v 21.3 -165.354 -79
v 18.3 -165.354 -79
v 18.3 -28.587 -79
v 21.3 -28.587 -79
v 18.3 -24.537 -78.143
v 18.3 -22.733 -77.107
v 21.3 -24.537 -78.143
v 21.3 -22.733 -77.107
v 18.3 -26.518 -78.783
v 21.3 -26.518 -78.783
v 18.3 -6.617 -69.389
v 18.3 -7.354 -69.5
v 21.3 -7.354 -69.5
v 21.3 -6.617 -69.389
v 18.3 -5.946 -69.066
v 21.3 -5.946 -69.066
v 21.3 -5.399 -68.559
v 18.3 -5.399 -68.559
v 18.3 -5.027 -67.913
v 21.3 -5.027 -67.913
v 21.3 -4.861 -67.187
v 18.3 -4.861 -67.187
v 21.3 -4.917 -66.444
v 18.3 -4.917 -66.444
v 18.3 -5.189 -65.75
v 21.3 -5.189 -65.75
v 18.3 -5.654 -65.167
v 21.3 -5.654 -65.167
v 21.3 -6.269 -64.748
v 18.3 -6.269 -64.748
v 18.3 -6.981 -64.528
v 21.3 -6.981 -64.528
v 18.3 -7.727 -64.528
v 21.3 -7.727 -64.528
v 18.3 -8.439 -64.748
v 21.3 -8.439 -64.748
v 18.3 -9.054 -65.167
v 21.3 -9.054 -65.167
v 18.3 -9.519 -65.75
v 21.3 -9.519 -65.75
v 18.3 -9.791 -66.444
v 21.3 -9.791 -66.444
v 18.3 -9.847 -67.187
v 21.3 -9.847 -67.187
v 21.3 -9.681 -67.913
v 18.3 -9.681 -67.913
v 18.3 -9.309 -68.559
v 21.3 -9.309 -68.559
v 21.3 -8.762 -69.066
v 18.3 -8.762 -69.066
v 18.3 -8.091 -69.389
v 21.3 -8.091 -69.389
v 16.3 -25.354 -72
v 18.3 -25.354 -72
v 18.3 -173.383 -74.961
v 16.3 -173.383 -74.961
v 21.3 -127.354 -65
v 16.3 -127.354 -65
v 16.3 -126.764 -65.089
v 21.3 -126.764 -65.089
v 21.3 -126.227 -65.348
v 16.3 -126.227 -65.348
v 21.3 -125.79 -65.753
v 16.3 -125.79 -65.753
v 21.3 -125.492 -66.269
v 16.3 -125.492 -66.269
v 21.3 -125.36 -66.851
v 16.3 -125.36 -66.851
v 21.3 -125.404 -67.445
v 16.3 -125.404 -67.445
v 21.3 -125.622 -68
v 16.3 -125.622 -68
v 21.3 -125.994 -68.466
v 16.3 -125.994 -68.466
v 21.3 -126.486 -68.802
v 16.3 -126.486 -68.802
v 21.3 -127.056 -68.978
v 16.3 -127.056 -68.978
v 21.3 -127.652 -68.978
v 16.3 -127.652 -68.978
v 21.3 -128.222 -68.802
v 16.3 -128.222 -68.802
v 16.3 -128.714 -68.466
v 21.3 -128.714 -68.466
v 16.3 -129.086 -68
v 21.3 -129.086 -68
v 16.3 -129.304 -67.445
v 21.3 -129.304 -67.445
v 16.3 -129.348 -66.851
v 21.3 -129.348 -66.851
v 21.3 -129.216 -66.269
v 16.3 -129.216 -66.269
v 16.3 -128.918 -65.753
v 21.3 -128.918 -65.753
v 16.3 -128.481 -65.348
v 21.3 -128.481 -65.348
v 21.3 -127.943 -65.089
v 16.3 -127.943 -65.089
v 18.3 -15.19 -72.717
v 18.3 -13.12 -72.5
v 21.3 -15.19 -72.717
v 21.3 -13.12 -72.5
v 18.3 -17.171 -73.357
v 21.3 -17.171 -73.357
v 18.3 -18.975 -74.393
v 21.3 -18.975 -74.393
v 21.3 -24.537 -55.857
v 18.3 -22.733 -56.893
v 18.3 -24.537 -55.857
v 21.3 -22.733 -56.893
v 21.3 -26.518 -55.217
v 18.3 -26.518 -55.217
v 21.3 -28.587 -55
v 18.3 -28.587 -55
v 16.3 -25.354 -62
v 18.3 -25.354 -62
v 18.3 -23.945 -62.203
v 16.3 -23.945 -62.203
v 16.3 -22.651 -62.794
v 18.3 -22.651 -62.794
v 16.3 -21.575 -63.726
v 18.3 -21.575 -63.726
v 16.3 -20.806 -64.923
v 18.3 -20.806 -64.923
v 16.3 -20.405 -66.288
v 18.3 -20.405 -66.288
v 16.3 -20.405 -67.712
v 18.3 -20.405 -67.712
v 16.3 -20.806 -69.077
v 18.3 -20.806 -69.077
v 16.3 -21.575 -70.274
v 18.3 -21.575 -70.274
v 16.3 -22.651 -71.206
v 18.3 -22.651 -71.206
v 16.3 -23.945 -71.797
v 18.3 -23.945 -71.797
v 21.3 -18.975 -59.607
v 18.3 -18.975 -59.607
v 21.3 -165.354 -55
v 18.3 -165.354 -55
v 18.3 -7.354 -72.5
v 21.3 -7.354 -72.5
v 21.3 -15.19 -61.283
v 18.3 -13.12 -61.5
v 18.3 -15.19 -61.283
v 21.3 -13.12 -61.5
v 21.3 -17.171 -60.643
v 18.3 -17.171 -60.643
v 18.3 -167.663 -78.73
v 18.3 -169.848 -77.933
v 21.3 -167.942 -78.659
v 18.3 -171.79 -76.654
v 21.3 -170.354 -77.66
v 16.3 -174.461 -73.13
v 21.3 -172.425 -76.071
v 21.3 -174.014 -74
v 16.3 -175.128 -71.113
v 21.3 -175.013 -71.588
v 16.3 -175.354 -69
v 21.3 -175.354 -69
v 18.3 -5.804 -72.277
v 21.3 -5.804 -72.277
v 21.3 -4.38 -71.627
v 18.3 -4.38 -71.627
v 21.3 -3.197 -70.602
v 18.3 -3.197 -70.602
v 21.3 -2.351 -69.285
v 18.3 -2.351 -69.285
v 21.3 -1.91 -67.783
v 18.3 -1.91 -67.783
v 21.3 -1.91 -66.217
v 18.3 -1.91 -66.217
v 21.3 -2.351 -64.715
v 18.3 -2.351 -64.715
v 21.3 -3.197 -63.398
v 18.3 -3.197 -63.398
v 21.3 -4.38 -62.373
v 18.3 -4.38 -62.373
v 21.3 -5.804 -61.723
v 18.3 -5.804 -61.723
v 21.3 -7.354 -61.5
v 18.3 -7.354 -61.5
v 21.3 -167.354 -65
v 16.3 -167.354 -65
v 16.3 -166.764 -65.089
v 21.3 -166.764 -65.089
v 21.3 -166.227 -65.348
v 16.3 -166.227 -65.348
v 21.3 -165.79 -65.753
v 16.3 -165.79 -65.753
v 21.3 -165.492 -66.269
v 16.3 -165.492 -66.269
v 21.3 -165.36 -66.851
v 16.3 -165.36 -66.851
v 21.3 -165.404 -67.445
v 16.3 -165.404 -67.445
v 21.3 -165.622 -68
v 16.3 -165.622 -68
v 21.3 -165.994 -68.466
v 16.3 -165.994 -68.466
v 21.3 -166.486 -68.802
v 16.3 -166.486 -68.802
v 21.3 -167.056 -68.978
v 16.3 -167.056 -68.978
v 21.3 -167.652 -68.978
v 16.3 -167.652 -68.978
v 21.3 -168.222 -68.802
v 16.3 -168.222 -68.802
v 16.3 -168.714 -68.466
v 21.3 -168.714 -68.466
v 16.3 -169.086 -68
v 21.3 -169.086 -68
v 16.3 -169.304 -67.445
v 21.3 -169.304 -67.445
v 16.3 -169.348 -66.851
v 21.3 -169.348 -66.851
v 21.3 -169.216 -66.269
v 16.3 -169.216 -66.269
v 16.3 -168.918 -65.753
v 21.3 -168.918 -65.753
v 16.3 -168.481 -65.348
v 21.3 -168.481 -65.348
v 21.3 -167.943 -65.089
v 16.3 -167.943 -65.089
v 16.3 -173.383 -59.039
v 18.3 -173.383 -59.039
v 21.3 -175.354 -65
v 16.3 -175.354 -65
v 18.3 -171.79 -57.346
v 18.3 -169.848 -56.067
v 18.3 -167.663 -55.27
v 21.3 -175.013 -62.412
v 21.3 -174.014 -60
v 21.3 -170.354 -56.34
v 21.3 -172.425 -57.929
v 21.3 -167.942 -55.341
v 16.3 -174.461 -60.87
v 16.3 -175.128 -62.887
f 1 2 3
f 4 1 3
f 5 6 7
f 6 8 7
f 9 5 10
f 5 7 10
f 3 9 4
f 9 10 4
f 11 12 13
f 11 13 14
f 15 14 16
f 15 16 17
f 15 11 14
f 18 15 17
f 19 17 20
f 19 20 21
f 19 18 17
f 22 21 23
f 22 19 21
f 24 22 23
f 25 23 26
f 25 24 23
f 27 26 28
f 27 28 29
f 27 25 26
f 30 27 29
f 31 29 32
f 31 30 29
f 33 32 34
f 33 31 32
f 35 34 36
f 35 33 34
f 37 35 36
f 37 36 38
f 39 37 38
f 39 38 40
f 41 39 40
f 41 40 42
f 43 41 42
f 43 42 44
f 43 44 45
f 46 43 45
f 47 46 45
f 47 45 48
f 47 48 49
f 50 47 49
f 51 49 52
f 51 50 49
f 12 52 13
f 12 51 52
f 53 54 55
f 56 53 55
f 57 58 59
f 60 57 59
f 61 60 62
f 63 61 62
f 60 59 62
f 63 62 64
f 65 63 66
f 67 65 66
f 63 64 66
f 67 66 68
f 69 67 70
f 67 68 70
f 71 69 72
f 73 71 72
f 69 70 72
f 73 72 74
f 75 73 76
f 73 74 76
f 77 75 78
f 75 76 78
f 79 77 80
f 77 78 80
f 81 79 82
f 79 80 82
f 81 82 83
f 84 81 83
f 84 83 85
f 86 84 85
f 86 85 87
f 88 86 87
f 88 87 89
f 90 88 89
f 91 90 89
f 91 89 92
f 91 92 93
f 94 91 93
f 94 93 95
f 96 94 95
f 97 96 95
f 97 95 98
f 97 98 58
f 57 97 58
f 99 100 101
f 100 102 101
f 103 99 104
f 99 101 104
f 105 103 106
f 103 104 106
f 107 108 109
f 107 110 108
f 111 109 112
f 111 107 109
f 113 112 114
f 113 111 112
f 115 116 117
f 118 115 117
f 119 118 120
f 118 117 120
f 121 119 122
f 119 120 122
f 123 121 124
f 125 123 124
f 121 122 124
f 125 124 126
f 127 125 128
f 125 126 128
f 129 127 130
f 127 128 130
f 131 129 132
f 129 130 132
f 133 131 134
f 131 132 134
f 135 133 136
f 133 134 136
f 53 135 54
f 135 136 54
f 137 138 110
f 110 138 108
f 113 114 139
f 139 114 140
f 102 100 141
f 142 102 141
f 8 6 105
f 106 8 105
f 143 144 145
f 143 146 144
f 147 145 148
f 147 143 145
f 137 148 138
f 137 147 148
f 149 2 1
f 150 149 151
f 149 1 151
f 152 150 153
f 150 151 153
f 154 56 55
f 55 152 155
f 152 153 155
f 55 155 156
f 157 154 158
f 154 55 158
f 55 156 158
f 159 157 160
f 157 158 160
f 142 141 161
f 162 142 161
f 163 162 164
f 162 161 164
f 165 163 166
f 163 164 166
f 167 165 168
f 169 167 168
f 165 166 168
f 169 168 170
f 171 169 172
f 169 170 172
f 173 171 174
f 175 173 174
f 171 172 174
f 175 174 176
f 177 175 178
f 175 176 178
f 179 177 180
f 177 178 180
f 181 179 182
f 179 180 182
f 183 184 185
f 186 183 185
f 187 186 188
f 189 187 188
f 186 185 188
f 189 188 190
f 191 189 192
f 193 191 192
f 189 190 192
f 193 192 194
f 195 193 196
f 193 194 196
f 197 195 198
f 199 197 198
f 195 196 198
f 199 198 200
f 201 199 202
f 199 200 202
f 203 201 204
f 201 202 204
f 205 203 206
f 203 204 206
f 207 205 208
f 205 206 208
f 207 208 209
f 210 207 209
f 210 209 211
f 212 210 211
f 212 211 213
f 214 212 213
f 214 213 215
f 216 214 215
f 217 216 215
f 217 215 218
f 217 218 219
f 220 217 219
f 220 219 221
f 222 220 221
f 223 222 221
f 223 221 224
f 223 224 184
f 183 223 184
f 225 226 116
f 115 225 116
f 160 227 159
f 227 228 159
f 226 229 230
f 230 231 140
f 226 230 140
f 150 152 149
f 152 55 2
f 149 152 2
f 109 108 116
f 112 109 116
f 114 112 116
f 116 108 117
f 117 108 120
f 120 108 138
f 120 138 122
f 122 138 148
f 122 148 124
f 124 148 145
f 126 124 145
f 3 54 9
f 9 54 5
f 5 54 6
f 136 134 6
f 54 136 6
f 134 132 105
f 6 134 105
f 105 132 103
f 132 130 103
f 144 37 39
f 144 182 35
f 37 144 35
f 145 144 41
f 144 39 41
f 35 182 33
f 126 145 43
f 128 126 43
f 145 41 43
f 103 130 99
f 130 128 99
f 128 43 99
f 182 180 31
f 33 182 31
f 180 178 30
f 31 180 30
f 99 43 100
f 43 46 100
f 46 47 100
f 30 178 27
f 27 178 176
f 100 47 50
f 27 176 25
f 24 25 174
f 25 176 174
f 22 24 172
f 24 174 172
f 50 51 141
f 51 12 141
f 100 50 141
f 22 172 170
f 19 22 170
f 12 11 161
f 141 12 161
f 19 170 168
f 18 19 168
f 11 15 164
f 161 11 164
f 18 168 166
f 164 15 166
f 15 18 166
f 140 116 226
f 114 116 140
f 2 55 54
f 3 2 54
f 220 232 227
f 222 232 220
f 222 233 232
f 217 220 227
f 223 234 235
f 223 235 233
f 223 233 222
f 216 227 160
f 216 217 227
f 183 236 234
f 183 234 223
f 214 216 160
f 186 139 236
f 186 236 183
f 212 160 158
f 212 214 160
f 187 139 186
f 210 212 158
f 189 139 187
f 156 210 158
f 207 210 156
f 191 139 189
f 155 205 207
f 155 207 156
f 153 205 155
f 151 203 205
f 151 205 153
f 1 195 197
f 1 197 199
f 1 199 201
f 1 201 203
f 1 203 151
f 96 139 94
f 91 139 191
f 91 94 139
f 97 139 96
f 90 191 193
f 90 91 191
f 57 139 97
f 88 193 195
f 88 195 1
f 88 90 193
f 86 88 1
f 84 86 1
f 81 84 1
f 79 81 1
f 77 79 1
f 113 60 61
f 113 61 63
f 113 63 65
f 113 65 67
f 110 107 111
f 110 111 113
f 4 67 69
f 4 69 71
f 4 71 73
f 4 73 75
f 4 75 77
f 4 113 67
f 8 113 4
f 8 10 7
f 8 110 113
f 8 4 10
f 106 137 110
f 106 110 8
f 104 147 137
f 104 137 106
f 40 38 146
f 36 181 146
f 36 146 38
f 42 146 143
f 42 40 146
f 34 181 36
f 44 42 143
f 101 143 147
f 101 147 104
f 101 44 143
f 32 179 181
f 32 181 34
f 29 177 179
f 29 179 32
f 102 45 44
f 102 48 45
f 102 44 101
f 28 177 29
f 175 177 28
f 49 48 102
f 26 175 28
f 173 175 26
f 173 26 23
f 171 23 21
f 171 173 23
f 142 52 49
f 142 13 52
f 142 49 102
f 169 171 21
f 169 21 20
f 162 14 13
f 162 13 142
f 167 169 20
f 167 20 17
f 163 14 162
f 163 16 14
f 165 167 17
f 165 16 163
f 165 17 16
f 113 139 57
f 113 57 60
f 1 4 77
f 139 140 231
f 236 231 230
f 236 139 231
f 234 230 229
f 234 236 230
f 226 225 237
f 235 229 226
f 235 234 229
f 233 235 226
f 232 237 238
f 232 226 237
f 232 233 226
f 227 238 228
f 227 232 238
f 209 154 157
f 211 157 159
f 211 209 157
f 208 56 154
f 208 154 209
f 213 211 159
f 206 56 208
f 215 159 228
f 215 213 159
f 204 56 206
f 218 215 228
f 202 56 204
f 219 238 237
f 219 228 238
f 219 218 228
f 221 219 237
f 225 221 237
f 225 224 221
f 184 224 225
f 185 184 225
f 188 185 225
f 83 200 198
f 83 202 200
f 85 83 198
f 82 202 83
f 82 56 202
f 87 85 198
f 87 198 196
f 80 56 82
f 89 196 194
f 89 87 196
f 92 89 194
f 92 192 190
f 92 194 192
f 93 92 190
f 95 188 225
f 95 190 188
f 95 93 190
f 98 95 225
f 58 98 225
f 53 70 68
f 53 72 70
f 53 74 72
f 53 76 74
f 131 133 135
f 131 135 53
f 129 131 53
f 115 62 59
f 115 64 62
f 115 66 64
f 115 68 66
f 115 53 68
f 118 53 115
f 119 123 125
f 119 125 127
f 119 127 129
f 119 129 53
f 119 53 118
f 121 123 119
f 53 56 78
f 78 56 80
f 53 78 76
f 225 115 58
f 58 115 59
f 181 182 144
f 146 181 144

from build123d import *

# Parameters (mm, degrees)
SKETCH1_R           = 2.5
BOSS_EXTRUDE1_DEPTH = 3
BOSS_EXTRUDE2_DEPTH = 2
FILLET4_R           = 10
SKETCH5_R           = 2
CUT_EXTRUDE1_DEPTH  = 6


with BuildPart() as part:
    # Sketch1 → Boss-Extrude1 (new body)
    with BuildSketch(Plane(origin=(18.3, 0, 0), x_dir=(0, 0, -1), z_dir=(1, 0, 0))):
        with BuildLine():
            Line((61.5, -7.353946086), (61.5, -16.353946086))
            Line((61.5, -16.353946086), (55, -25.353946086))
            Line((55, -25.353946086), (55, -175.353946086))
            Line((55, -175.353946086), (79, -175.353946086))
            Line((79, -175.353946086), (79, -25.353946086))
            Line((79, -25.353946086), (72.5, -16.353946086))
            Line((72.5, -16.353946086), (72.5, -7.353946086))
            ThreePointArc((72.5, -7.353946086), (67, -1.853946086), (61.5, -7.353946086))
        make_face()
        with Locations((67, -7.353946086)):
            Circle(SKETCH1_R, mode=Mode.SUBTRACT)
    extrude(amount=BOSS_EXTRUDE1_DEPTH)

    # Sketch4 → Boss-Extrude2 (add)
    with BuildSketch(Plane.ZY.offset(-18.3)):
        with BuildLine():
            Line((-72, -25.353946086), (-75, -175.353946086))
            Line((-75, -175.353946086), (-59, -175.353946086))
            Line((-59, -175.353946086), (-62, -25.353946086))
            ThreePointArc((-62, -25.353946086), (-67, -20.353946086), (-72, -25.353946086))
        make_face()
    extrude(amount=BOSS_EXTRUDE2_DEPTH)

    # Fillet4
    fillet4_edges = [part.edges().sort_by_distance(p)[0] for p in [
        (19.8, -175.353946086, -55),
        (19.8, -175.353946086, -79),
        (19.8, -25.353946086, -55),
        (19.8, -16.353946086, -61.5),
        (19.8, -25.353946086, -79),
        (19.8, -16.353946086, -72.5),
    ]]
    fillet(fillet4_edges, radius=FILLET4_R)

    # Sketch5 → Cut-Extrude1 (cut, through all)
    with BuildSketch(Plane.ZY.offset(-16.3)):
        with Locations((-67, -127.353946086)):
            Circle(SKETCH5_R)
        with Locations((-67, -167.353946086)):
            Circle(SKETCH5_R)
    extrude(amount=-CUT_EXTRUDE1_DEPTH, mode=Mode.SUBTRACT)


solid = part.part
